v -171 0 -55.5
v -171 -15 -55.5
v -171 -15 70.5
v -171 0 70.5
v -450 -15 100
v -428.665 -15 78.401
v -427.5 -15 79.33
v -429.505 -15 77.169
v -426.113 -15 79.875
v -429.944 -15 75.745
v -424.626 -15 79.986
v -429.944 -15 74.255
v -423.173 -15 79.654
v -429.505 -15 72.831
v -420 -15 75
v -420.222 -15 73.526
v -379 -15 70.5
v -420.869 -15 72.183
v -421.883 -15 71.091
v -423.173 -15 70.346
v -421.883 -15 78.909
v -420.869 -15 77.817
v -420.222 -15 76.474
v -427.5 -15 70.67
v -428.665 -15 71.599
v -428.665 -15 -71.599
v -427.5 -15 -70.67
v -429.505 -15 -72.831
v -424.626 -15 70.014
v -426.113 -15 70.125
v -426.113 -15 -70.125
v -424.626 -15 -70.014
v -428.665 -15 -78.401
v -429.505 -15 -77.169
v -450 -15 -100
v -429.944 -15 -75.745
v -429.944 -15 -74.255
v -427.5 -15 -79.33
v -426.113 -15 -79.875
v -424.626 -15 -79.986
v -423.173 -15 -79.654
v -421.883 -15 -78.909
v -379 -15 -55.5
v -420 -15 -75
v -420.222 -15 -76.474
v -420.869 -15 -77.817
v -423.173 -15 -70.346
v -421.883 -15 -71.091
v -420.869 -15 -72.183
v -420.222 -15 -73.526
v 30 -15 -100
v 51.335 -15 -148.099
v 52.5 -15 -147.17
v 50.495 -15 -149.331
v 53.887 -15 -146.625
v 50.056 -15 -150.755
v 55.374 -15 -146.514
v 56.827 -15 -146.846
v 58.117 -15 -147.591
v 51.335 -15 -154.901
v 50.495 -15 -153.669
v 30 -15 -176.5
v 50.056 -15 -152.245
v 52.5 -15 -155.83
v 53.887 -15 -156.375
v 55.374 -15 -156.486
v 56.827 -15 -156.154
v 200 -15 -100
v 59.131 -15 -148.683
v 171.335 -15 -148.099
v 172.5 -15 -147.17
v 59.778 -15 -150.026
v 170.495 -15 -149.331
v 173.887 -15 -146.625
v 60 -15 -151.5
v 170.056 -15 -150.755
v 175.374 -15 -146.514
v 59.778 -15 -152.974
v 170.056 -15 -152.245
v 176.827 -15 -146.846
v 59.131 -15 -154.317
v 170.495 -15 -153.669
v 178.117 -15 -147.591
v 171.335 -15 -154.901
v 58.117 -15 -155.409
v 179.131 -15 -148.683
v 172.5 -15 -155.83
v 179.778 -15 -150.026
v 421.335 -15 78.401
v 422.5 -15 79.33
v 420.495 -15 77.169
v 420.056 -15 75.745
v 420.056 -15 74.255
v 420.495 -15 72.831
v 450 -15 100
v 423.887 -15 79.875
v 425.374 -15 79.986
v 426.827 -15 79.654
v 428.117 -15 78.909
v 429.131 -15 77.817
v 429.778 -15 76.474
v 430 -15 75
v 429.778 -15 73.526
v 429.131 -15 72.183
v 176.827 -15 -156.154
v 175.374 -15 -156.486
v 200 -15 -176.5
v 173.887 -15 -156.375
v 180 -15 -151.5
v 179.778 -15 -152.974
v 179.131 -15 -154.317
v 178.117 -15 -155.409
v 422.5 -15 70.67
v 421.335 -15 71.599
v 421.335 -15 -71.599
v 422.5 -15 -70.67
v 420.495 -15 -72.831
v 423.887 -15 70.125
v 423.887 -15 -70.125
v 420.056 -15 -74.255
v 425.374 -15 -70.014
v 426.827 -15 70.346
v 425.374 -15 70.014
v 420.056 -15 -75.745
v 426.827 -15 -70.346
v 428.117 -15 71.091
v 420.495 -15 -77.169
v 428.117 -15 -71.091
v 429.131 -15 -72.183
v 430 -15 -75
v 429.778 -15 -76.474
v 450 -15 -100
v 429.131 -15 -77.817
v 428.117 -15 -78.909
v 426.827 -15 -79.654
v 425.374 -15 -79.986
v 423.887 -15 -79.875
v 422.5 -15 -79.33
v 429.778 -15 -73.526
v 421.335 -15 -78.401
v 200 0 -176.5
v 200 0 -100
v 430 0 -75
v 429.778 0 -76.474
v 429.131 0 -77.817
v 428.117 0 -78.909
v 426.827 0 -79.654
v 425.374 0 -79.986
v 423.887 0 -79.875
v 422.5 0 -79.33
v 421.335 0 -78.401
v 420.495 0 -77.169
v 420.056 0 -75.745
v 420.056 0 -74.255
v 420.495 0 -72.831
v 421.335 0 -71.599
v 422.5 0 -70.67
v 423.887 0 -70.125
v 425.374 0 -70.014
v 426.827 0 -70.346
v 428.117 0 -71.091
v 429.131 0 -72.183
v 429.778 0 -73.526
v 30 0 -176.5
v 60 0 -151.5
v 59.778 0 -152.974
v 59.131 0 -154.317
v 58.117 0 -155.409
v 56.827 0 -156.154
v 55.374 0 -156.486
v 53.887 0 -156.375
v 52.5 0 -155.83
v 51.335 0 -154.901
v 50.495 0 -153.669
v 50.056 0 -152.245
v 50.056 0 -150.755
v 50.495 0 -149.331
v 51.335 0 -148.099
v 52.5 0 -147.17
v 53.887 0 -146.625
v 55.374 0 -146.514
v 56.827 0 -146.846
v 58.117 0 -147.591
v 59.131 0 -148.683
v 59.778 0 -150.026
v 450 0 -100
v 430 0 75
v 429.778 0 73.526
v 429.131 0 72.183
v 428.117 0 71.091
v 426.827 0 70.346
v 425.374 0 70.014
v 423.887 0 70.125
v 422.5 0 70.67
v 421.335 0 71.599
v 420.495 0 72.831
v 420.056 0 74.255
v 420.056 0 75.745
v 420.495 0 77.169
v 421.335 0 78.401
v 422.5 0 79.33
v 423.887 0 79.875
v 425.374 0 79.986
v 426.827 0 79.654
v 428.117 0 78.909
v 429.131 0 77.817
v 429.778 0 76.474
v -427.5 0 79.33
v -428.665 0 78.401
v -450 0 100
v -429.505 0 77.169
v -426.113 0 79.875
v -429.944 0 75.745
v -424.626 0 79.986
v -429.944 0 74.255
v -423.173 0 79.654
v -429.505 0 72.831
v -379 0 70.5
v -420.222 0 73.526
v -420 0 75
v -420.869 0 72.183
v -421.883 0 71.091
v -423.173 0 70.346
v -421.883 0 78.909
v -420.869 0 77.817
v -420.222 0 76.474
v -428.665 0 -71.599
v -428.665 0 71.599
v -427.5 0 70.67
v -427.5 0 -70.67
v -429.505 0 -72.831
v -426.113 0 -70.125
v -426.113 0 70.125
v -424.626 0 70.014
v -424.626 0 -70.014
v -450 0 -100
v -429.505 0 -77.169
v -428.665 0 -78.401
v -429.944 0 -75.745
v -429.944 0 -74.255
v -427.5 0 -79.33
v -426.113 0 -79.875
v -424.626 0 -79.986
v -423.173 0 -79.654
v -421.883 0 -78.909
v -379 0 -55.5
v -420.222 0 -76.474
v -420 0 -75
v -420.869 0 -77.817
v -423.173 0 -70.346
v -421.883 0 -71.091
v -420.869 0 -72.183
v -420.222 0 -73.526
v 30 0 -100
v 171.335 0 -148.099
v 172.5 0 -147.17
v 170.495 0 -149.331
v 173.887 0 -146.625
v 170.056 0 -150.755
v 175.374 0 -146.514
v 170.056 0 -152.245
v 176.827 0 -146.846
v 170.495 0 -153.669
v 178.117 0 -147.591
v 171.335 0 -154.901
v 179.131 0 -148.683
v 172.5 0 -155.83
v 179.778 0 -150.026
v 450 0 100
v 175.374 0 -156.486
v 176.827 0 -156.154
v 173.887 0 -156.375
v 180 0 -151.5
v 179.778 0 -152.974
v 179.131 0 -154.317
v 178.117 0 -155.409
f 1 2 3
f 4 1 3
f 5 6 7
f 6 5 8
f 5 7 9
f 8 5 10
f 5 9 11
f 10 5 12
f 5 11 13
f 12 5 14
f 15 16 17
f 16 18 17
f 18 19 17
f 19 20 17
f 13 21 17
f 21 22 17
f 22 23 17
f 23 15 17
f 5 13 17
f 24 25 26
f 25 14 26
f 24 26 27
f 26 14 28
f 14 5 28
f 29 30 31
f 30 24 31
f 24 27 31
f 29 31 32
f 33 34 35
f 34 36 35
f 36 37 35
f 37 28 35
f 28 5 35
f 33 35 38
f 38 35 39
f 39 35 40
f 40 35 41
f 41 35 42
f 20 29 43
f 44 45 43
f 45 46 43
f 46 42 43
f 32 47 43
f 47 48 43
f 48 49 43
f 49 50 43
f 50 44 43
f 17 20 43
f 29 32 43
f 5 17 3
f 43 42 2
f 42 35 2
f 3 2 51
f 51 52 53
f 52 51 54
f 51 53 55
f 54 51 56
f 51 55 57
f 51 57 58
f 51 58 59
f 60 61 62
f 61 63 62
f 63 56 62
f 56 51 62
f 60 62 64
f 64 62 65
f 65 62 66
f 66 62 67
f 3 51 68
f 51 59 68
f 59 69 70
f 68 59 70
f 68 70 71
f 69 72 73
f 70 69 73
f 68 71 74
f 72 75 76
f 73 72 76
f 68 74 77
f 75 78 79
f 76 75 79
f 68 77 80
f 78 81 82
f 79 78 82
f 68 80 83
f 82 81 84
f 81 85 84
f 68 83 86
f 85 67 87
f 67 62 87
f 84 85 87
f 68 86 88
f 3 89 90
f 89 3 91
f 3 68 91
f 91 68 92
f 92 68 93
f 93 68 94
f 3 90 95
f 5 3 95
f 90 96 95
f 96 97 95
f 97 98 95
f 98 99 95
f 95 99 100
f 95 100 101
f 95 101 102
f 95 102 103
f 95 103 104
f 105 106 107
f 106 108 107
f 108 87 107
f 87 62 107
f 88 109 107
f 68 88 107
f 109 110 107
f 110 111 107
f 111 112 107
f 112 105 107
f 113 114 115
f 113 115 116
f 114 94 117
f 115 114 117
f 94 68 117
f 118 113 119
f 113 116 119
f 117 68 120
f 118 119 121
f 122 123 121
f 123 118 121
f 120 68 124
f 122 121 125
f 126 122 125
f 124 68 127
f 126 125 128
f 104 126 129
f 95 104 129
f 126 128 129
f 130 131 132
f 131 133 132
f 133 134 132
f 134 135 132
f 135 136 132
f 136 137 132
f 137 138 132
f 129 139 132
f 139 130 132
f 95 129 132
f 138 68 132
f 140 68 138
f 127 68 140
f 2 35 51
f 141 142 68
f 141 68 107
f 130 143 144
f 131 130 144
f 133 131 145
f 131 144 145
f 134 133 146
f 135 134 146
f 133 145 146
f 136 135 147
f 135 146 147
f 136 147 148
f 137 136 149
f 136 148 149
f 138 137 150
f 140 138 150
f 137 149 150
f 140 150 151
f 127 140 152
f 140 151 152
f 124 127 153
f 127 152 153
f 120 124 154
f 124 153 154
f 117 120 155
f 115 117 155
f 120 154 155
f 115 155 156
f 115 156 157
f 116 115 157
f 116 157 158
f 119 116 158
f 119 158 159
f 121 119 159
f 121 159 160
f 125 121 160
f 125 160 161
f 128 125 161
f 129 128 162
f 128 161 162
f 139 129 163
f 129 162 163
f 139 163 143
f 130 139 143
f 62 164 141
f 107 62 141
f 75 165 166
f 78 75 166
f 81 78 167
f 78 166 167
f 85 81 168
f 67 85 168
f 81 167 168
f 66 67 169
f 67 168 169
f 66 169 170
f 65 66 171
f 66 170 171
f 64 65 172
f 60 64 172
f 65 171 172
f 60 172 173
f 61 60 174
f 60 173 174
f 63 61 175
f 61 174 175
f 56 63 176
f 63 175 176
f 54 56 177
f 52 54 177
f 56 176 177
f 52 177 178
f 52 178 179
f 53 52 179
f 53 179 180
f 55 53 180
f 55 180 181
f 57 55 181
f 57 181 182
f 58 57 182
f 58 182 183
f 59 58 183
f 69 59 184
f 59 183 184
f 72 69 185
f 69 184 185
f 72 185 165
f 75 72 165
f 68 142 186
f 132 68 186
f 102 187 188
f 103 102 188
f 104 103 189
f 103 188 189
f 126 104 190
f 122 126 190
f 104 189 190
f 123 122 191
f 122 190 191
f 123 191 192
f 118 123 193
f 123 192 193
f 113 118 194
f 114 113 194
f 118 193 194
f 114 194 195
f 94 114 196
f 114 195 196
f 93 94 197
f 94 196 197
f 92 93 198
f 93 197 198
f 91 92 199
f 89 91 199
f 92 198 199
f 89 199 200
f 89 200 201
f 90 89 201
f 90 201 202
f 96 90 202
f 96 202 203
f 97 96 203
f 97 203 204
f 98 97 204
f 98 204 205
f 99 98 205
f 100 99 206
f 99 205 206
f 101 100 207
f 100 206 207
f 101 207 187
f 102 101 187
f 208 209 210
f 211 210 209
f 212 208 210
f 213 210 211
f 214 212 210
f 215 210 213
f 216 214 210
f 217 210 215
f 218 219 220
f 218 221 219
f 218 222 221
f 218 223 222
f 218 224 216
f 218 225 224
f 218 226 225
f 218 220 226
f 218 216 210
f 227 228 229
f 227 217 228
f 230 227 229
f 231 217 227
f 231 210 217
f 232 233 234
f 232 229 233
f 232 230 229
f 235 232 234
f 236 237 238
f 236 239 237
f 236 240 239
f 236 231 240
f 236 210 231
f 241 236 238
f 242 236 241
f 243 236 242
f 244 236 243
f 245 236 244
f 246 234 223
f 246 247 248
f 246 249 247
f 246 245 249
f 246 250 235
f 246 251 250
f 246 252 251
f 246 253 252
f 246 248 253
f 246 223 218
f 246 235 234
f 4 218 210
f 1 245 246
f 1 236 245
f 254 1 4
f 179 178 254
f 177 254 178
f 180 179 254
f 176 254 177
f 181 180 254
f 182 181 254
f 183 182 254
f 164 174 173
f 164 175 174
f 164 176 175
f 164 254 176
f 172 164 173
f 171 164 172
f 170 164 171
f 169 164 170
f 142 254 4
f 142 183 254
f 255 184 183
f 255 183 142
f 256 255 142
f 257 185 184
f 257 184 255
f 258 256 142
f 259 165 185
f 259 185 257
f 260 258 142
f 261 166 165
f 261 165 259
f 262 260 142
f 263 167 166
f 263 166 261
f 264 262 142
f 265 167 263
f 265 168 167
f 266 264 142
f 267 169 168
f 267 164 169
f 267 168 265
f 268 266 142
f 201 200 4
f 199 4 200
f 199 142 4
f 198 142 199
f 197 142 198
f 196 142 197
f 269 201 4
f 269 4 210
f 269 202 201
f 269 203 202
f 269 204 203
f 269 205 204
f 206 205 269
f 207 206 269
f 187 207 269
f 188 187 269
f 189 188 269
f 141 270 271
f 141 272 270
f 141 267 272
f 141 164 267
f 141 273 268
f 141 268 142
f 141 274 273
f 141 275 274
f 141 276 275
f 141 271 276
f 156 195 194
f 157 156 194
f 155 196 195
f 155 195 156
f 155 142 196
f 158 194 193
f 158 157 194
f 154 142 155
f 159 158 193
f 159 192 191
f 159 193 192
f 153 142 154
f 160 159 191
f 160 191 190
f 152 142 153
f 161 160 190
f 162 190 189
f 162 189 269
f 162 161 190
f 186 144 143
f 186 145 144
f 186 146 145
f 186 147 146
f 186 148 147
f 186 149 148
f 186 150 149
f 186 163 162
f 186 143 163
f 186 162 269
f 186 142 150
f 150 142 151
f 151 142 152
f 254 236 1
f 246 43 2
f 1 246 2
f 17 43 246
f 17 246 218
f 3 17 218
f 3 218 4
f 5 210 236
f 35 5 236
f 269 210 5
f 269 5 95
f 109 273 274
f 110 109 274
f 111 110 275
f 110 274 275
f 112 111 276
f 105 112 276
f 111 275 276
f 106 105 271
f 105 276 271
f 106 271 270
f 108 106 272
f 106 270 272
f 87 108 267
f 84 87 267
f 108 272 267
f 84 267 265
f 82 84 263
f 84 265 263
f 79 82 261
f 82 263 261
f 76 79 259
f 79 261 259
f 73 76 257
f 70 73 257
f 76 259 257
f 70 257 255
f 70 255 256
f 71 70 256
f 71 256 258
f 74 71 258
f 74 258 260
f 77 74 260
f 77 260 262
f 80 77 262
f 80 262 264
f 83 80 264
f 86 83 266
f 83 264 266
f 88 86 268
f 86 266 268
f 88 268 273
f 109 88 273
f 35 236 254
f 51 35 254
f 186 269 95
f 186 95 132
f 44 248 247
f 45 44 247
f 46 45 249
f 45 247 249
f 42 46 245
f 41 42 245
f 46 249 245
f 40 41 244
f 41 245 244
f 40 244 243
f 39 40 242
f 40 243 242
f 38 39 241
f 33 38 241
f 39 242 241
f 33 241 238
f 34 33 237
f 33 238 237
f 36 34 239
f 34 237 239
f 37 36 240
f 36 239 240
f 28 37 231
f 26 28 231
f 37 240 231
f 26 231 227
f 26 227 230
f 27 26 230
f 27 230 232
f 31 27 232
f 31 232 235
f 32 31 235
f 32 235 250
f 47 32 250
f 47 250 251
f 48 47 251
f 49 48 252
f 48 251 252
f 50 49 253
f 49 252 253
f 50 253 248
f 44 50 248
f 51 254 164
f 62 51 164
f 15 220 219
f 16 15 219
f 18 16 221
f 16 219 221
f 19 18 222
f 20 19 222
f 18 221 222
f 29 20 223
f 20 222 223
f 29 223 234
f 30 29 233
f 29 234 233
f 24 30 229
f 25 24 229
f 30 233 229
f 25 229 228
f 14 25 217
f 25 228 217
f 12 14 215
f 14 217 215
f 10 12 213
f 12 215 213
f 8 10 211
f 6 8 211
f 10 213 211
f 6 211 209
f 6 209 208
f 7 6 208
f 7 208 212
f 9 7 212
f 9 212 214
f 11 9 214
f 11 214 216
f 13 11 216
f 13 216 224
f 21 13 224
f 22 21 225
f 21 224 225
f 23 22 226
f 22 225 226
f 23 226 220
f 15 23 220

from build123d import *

# Parameters (mm, degrees)
SKETCH1_W              = 900
SKETCH1_H              = 200
SKETCH1_R              = 5
BOSS_EXTRUDE1_DEPTH    = 15
SKETCH2_W              = 208
SKETCH2_H              = 126
SHREDDER_OPENING_DEPTH = 16
SKETCH3_W              = 170
SKETCH3_H              = 76.5
SKETCH3_R              = 5
LEGS_ADD_ON_DEPTH      = 15


with BuildPart() as part:
    # Sketch1 → Boss-Extrude1 (new body)
    with BuildSketch(Plane(origin=(0, 0, 0), x_dir=(1, 0, 0), z_dir=(0, 1, 0))):
        Rectangle(SKETCH1_W, SKETCH1_H)
        with Locations((425, -75)):
            Circle(SKETCH1_R, mode=Mode.SUBTRACT)
        with Locations((425, 75)):
            Circle(SKETCH1_R, mode=Mode.SUBTRACT)
        with Locations((-425, -75)):
            Circle(SKETCH1_R, mode=Mode.SUBTRACT)
        with Locations((-425, 75)):
            Circle(SKETCH1_R, mode=Mode.SUBTRACT)
    extrude(amount=-BOSS_EXTRUDE1_DEPTH)

    # Sketch2 → Shredder Opening (cut, through all)
    with BuildSketch(Plane.XZ.offset(15)):
        with Locations((-275, 7.5)):
            Rectangle(SKETCH2_W, SKETCH2_H)
    extrude(amount=-SHREDDER_OPENING_DEPTH, mode=Mode.SUBTRACT)

    # Sketch3 → Legs add on (add, through all)
    with BuildSketch(Plane(origin=(0, 0, 0), x_dir=(1, 0, 0), z_dir=(0, 1, 0))):
        with Locations((115, 138.25)):
            Rectangle(SKETCH3_W, SKETCH3_H)
        with Locations((175, 151.5)):
            Circle(SKETCH3_R, mode=Mode.SUBTRACT)
        with Locations((55, 151.5)):
            Circle(SKETCH3_R, mode=Mode.SUBTRACT)
    extrude(amount=-LEGS_ADD_ON_DEPTH)


solid = part.part
